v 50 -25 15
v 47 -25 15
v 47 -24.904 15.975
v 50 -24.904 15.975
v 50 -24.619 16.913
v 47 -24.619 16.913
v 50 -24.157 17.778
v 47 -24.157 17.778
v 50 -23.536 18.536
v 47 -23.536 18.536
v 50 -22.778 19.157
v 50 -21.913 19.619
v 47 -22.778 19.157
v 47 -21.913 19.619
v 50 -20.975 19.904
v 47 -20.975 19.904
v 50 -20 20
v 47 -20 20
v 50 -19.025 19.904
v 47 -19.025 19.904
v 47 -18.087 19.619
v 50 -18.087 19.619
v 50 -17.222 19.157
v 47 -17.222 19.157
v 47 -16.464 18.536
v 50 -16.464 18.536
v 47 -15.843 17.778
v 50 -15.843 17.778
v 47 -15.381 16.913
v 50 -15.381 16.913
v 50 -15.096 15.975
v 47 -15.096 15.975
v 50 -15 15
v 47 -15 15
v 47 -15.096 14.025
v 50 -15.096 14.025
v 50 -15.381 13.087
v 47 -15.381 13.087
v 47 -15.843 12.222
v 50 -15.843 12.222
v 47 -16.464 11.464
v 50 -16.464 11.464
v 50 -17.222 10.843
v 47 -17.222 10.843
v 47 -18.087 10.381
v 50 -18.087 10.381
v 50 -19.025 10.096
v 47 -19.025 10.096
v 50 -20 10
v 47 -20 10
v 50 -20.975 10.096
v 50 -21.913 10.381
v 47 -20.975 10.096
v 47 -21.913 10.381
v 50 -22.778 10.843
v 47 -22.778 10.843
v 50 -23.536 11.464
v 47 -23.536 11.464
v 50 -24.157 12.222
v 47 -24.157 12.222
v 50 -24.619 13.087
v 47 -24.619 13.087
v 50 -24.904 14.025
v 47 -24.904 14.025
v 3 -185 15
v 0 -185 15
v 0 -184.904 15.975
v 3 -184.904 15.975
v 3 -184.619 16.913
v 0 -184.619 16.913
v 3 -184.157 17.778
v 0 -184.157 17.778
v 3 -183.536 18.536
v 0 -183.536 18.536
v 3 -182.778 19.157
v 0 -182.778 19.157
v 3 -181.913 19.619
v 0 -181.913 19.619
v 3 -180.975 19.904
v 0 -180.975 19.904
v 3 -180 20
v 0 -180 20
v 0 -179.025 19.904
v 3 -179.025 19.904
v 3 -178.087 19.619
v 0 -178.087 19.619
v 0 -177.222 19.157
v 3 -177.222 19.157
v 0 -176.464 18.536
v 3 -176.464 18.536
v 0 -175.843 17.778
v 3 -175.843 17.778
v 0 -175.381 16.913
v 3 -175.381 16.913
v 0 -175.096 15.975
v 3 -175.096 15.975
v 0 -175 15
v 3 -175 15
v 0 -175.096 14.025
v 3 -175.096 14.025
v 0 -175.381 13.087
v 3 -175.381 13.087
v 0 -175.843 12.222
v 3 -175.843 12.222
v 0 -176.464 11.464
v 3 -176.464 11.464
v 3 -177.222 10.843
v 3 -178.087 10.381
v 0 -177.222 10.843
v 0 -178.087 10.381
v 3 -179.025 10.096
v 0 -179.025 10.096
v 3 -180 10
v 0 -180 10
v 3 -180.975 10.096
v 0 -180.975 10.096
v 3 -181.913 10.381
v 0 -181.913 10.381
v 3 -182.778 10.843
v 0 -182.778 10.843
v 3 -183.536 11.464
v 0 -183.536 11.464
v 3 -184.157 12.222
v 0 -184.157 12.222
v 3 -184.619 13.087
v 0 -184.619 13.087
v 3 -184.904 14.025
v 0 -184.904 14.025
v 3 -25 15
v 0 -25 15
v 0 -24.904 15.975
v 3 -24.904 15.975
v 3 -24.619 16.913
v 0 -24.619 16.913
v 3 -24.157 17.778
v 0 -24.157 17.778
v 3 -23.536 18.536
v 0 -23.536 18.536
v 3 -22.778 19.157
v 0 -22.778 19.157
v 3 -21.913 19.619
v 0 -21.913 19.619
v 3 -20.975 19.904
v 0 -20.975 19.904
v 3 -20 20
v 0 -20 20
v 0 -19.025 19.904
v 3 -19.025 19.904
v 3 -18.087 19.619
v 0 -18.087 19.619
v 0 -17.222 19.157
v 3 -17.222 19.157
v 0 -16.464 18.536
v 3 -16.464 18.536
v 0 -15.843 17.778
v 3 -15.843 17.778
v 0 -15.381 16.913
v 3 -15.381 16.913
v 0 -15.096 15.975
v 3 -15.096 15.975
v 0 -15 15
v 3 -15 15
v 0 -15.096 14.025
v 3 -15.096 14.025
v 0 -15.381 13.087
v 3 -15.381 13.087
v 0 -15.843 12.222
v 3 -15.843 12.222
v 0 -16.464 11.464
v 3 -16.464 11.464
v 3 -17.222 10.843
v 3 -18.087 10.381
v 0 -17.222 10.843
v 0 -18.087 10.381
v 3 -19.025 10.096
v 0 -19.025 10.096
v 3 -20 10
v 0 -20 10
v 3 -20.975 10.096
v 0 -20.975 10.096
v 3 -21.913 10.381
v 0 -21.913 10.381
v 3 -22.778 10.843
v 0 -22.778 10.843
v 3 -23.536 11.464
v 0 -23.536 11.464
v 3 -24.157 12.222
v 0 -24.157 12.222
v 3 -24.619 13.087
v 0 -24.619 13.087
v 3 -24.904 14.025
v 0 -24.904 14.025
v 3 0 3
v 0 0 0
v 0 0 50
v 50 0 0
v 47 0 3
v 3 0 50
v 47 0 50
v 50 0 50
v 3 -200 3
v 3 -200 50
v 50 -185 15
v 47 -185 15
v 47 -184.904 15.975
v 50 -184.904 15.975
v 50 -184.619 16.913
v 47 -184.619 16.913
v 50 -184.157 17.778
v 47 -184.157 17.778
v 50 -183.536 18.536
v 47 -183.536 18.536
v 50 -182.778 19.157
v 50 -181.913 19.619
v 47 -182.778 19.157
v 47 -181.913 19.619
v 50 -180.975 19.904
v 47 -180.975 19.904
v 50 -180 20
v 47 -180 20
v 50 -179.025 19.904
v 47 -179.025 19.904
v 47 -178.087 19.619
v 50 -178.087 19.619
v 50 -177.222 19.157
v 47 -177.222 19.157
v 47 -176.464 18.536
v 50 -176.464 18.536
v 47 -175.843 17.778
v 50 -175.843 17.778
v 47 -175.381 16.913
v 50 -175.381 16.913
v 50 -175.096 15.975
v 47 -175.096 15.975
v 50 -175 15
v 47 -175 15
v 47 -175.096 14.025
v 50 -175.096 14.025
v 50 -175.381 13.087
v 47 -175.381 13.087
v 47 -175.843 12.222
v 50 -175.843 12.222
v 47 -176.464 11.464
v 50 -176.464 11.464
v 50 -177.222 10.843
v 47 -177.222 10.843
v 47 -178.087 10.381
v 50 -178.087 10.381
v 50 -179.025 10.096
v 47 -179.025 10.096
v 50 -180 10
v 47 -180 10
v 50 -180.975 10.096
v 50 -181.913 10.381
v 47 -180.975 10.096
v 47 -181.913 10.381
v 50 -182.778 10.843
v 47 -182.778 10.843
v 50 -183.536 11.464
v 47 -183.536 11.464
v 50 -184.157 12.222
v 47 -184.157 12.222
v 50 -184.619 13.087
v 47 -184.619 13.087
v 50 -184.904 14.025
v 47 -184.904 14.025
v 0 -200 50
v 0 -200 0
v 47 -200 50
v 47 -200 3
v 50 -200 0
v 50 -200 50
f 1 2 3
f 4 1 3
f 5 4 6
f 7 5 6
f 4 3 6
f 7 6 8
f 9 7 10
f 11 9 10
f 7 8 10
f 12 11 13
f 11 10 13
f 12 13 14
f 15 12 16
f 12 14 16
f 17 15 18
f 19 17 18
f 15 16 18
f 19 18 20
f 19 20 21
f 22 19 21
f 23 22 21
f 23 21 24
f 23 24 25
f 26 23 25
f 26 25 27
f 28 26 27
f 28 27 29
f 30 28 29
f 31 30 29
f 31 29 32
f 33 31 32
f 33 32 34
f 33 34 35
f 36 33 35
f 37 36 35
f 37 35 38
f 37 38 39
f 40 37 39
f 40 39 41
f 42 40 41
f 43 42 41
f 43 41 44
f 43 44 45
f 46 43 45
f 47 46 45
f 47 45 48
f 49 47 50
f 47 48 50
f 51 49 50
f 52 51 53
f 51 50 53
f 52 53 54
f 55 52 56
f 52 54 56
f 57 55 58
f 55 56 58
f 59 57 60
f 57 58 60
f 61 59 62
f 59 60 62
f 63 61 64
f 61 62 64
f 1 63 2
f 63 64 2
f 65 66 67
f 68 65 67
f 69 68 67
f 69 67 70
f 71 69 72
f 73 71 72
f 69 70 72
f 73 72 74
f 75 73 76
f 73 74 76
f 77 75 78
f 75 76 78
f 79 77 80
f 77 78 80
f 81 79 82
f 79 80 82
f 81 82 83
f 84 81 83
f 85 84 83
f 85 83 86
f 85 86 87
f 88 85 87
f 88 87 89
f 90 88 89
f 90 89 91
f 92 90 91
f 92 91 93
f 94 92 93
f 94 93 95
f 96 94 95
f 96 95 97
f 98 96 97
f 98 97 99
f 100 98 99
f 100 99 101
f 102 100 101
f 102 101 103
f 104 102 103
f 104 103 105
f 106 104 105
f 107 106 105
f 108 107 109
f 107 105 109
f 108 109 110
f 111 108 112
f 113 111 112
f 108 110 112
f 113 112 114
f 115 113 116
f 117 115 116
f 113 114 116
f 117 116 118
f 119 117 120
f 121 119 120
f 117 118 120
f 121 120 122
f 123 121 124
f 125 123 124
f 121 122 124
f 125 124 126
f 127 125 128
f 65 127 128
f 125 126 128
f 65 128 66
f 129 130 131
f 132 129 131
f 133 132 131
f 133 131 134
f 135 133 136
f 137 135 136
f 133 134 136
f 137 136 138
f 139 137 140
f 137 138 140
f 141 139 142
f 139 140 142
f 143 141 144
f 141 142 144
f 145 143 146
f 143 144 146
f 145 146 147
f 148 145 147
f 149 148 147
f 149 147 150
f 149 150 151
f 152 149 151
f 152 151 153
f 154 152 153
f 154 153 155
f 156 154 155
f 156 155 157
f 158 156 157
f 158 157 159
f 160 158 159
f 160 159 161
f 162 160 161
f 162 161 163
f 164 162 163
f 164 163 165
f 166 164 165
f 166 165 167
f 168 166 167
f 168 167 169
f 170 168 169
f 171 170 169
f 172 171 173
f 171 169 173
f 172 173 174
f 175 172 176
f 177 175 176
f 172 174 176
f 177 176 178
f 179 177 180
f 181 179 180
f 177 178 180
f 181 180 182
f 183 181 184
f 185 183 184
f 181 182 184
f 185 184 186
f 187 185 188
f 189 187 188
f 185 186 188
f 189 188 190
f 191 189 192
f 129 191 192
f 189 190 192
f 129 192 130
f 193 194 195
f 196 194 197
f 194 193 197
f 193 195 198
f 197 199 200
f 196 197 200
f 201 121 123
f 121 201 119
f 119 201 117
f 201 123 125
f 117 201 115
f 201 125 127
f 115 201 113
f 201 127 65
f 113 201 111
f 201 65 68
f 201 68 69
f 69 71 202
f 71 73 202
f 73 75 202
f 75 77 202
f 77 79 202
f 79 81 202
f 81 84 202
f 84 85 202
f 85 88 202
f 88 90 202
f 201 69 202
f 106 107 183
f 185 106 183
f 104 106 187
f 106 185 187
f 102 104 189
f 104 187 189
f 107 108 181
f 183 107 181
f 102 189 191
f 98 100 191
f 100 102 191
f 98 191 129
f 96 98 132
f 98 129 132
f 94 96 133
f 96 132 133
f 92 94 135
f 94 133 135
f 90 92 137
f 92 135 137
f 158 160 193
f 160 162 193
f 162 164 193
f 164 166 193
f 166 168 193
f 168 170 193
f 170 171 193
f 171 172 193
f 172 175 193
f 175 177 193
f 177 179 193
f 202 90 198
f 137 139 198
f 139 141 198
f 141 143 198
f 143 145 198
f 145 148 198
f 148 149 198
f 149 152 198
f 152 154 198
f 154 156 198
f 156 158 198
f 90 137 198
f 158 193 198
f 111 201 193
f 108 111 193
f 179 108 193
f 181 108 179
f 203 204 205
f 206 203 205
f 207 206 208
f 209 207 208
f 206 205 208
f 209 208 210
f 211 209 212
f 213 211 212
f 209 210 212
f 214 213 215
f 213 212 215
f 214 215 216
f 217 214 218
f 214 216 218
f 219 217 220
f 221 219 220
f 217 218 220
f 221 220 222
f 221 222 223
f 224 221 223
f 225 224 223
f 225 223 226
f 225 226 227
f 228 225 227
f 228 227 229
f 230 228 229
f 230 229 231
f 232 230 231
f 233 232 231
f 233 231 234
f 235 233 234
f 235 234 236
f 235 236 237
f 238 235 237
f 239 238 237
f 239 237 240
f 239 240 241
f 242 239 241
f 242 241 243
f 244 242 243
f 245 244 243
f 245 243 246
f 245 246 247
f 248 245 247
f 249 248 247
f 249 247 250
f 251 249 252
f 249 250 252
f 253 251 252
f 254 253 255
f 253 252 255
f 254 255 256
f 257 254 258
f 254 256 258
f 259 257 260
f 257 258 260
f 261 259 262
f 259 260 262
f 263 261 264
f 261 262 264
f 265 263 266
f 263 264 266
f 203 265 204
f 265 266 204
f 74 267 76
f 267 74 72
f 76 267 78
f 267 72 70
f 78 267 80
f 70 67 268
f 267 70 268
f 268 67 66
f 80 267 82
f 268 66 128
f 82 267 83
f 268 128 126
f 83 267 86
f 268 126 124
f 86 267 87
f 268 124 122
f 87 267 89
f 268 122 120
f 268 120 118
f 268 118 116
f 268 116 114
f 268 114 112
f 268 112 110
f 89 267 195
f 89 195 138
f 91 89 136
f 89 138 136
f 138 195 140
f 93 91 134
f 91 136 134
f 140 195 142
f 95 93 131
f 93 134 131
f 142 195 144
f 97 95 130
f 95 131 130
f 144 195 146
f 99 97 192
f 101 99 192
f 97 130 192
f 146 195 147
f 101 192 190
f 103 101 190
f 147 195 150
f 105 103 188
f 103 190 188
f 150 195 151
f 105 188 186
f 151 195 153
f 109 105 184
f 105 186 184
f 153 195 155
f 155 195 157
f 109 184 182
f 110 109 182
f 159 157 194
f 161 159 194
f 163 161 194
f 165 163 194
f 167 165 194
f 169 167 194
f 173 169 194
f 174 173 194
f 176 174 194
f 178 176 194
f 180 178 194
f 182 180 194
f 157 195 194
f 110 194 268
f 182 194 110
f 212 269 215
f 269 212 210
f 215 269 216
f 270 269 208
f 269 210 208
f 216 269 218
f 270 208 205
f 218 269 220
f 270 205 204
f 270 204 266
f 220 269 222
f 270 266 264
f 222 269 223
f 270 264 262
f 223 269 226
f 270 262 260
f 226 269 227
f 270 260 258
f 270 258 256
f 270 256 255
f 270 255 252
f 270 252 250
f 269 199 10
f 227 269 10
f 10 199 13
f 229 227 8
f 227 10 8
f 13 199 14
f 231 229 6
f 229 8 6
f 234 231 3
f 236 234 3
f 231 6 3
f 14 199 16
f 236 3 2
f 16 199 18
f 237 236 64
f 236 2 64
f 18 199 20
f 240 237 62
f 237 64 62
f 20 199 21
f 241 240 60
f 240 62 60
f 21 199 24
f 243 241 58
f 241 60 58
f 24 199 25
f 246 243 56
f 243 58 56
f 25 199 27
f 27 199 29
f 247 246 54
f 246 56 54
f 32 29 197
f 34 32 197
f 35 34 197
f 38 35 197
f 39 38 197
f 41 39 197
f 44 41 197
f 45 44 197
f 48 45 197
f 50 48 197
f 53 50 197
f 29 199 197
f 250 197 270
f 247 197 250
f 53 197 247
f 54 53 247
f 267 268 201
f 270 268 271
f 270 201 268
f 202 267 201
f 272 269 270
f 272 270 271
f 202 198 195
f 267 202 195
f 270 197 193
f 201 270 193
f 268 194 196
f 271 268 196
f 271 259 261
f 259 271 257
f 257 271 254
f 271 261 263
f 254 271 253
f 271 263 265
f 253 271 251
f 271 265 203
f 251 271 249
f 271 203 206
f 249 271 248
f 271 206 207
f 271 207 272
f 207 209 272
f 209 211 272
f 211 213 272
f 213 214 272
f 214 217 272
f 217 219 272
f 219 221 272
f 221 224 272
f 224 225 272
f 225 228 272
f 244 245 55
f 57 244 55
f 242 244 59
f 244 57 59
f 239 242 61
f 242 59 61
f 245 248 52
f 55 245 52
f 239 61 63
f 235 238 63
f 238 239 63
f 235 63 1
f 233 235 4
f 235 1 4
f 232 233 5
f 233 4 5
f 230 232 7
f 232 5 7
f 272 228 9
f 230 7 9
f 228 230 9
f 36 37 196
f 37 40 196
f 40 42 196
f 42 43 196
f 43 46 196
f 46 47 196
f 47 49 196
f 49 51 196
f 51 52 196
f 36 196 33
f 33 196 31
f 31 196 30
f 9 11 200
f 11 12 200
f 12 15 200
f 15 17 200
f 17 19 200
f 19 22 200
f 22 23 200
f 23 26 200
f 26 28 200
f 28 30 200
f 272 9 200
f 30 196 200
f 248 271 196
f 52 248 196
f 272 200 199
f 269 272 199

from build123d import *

# Parameters (mm, degrees)
F1_DEPTH = 200
F3_D     = 10
F3_DEPTH = 50


with BuildPart() as f1:
    # F0 (on Front) → F1 (new body)
    with BuildSketch(Plane.XZ):
        Polygon((0, 50), (0, 0), (50, 0), (50, 50), (47, 50), (47, 3), (3, 3), (3, 50), align=None)
    extrude(amount=F1_DEPTH)

    # F3
    with Locations(Plane.YZ.offset(50)):
        with Locations((-180, 15), (-20, 15)):
            Hole(F3_D / 2, depth=F3_DEPTH)


solid = f1.part
